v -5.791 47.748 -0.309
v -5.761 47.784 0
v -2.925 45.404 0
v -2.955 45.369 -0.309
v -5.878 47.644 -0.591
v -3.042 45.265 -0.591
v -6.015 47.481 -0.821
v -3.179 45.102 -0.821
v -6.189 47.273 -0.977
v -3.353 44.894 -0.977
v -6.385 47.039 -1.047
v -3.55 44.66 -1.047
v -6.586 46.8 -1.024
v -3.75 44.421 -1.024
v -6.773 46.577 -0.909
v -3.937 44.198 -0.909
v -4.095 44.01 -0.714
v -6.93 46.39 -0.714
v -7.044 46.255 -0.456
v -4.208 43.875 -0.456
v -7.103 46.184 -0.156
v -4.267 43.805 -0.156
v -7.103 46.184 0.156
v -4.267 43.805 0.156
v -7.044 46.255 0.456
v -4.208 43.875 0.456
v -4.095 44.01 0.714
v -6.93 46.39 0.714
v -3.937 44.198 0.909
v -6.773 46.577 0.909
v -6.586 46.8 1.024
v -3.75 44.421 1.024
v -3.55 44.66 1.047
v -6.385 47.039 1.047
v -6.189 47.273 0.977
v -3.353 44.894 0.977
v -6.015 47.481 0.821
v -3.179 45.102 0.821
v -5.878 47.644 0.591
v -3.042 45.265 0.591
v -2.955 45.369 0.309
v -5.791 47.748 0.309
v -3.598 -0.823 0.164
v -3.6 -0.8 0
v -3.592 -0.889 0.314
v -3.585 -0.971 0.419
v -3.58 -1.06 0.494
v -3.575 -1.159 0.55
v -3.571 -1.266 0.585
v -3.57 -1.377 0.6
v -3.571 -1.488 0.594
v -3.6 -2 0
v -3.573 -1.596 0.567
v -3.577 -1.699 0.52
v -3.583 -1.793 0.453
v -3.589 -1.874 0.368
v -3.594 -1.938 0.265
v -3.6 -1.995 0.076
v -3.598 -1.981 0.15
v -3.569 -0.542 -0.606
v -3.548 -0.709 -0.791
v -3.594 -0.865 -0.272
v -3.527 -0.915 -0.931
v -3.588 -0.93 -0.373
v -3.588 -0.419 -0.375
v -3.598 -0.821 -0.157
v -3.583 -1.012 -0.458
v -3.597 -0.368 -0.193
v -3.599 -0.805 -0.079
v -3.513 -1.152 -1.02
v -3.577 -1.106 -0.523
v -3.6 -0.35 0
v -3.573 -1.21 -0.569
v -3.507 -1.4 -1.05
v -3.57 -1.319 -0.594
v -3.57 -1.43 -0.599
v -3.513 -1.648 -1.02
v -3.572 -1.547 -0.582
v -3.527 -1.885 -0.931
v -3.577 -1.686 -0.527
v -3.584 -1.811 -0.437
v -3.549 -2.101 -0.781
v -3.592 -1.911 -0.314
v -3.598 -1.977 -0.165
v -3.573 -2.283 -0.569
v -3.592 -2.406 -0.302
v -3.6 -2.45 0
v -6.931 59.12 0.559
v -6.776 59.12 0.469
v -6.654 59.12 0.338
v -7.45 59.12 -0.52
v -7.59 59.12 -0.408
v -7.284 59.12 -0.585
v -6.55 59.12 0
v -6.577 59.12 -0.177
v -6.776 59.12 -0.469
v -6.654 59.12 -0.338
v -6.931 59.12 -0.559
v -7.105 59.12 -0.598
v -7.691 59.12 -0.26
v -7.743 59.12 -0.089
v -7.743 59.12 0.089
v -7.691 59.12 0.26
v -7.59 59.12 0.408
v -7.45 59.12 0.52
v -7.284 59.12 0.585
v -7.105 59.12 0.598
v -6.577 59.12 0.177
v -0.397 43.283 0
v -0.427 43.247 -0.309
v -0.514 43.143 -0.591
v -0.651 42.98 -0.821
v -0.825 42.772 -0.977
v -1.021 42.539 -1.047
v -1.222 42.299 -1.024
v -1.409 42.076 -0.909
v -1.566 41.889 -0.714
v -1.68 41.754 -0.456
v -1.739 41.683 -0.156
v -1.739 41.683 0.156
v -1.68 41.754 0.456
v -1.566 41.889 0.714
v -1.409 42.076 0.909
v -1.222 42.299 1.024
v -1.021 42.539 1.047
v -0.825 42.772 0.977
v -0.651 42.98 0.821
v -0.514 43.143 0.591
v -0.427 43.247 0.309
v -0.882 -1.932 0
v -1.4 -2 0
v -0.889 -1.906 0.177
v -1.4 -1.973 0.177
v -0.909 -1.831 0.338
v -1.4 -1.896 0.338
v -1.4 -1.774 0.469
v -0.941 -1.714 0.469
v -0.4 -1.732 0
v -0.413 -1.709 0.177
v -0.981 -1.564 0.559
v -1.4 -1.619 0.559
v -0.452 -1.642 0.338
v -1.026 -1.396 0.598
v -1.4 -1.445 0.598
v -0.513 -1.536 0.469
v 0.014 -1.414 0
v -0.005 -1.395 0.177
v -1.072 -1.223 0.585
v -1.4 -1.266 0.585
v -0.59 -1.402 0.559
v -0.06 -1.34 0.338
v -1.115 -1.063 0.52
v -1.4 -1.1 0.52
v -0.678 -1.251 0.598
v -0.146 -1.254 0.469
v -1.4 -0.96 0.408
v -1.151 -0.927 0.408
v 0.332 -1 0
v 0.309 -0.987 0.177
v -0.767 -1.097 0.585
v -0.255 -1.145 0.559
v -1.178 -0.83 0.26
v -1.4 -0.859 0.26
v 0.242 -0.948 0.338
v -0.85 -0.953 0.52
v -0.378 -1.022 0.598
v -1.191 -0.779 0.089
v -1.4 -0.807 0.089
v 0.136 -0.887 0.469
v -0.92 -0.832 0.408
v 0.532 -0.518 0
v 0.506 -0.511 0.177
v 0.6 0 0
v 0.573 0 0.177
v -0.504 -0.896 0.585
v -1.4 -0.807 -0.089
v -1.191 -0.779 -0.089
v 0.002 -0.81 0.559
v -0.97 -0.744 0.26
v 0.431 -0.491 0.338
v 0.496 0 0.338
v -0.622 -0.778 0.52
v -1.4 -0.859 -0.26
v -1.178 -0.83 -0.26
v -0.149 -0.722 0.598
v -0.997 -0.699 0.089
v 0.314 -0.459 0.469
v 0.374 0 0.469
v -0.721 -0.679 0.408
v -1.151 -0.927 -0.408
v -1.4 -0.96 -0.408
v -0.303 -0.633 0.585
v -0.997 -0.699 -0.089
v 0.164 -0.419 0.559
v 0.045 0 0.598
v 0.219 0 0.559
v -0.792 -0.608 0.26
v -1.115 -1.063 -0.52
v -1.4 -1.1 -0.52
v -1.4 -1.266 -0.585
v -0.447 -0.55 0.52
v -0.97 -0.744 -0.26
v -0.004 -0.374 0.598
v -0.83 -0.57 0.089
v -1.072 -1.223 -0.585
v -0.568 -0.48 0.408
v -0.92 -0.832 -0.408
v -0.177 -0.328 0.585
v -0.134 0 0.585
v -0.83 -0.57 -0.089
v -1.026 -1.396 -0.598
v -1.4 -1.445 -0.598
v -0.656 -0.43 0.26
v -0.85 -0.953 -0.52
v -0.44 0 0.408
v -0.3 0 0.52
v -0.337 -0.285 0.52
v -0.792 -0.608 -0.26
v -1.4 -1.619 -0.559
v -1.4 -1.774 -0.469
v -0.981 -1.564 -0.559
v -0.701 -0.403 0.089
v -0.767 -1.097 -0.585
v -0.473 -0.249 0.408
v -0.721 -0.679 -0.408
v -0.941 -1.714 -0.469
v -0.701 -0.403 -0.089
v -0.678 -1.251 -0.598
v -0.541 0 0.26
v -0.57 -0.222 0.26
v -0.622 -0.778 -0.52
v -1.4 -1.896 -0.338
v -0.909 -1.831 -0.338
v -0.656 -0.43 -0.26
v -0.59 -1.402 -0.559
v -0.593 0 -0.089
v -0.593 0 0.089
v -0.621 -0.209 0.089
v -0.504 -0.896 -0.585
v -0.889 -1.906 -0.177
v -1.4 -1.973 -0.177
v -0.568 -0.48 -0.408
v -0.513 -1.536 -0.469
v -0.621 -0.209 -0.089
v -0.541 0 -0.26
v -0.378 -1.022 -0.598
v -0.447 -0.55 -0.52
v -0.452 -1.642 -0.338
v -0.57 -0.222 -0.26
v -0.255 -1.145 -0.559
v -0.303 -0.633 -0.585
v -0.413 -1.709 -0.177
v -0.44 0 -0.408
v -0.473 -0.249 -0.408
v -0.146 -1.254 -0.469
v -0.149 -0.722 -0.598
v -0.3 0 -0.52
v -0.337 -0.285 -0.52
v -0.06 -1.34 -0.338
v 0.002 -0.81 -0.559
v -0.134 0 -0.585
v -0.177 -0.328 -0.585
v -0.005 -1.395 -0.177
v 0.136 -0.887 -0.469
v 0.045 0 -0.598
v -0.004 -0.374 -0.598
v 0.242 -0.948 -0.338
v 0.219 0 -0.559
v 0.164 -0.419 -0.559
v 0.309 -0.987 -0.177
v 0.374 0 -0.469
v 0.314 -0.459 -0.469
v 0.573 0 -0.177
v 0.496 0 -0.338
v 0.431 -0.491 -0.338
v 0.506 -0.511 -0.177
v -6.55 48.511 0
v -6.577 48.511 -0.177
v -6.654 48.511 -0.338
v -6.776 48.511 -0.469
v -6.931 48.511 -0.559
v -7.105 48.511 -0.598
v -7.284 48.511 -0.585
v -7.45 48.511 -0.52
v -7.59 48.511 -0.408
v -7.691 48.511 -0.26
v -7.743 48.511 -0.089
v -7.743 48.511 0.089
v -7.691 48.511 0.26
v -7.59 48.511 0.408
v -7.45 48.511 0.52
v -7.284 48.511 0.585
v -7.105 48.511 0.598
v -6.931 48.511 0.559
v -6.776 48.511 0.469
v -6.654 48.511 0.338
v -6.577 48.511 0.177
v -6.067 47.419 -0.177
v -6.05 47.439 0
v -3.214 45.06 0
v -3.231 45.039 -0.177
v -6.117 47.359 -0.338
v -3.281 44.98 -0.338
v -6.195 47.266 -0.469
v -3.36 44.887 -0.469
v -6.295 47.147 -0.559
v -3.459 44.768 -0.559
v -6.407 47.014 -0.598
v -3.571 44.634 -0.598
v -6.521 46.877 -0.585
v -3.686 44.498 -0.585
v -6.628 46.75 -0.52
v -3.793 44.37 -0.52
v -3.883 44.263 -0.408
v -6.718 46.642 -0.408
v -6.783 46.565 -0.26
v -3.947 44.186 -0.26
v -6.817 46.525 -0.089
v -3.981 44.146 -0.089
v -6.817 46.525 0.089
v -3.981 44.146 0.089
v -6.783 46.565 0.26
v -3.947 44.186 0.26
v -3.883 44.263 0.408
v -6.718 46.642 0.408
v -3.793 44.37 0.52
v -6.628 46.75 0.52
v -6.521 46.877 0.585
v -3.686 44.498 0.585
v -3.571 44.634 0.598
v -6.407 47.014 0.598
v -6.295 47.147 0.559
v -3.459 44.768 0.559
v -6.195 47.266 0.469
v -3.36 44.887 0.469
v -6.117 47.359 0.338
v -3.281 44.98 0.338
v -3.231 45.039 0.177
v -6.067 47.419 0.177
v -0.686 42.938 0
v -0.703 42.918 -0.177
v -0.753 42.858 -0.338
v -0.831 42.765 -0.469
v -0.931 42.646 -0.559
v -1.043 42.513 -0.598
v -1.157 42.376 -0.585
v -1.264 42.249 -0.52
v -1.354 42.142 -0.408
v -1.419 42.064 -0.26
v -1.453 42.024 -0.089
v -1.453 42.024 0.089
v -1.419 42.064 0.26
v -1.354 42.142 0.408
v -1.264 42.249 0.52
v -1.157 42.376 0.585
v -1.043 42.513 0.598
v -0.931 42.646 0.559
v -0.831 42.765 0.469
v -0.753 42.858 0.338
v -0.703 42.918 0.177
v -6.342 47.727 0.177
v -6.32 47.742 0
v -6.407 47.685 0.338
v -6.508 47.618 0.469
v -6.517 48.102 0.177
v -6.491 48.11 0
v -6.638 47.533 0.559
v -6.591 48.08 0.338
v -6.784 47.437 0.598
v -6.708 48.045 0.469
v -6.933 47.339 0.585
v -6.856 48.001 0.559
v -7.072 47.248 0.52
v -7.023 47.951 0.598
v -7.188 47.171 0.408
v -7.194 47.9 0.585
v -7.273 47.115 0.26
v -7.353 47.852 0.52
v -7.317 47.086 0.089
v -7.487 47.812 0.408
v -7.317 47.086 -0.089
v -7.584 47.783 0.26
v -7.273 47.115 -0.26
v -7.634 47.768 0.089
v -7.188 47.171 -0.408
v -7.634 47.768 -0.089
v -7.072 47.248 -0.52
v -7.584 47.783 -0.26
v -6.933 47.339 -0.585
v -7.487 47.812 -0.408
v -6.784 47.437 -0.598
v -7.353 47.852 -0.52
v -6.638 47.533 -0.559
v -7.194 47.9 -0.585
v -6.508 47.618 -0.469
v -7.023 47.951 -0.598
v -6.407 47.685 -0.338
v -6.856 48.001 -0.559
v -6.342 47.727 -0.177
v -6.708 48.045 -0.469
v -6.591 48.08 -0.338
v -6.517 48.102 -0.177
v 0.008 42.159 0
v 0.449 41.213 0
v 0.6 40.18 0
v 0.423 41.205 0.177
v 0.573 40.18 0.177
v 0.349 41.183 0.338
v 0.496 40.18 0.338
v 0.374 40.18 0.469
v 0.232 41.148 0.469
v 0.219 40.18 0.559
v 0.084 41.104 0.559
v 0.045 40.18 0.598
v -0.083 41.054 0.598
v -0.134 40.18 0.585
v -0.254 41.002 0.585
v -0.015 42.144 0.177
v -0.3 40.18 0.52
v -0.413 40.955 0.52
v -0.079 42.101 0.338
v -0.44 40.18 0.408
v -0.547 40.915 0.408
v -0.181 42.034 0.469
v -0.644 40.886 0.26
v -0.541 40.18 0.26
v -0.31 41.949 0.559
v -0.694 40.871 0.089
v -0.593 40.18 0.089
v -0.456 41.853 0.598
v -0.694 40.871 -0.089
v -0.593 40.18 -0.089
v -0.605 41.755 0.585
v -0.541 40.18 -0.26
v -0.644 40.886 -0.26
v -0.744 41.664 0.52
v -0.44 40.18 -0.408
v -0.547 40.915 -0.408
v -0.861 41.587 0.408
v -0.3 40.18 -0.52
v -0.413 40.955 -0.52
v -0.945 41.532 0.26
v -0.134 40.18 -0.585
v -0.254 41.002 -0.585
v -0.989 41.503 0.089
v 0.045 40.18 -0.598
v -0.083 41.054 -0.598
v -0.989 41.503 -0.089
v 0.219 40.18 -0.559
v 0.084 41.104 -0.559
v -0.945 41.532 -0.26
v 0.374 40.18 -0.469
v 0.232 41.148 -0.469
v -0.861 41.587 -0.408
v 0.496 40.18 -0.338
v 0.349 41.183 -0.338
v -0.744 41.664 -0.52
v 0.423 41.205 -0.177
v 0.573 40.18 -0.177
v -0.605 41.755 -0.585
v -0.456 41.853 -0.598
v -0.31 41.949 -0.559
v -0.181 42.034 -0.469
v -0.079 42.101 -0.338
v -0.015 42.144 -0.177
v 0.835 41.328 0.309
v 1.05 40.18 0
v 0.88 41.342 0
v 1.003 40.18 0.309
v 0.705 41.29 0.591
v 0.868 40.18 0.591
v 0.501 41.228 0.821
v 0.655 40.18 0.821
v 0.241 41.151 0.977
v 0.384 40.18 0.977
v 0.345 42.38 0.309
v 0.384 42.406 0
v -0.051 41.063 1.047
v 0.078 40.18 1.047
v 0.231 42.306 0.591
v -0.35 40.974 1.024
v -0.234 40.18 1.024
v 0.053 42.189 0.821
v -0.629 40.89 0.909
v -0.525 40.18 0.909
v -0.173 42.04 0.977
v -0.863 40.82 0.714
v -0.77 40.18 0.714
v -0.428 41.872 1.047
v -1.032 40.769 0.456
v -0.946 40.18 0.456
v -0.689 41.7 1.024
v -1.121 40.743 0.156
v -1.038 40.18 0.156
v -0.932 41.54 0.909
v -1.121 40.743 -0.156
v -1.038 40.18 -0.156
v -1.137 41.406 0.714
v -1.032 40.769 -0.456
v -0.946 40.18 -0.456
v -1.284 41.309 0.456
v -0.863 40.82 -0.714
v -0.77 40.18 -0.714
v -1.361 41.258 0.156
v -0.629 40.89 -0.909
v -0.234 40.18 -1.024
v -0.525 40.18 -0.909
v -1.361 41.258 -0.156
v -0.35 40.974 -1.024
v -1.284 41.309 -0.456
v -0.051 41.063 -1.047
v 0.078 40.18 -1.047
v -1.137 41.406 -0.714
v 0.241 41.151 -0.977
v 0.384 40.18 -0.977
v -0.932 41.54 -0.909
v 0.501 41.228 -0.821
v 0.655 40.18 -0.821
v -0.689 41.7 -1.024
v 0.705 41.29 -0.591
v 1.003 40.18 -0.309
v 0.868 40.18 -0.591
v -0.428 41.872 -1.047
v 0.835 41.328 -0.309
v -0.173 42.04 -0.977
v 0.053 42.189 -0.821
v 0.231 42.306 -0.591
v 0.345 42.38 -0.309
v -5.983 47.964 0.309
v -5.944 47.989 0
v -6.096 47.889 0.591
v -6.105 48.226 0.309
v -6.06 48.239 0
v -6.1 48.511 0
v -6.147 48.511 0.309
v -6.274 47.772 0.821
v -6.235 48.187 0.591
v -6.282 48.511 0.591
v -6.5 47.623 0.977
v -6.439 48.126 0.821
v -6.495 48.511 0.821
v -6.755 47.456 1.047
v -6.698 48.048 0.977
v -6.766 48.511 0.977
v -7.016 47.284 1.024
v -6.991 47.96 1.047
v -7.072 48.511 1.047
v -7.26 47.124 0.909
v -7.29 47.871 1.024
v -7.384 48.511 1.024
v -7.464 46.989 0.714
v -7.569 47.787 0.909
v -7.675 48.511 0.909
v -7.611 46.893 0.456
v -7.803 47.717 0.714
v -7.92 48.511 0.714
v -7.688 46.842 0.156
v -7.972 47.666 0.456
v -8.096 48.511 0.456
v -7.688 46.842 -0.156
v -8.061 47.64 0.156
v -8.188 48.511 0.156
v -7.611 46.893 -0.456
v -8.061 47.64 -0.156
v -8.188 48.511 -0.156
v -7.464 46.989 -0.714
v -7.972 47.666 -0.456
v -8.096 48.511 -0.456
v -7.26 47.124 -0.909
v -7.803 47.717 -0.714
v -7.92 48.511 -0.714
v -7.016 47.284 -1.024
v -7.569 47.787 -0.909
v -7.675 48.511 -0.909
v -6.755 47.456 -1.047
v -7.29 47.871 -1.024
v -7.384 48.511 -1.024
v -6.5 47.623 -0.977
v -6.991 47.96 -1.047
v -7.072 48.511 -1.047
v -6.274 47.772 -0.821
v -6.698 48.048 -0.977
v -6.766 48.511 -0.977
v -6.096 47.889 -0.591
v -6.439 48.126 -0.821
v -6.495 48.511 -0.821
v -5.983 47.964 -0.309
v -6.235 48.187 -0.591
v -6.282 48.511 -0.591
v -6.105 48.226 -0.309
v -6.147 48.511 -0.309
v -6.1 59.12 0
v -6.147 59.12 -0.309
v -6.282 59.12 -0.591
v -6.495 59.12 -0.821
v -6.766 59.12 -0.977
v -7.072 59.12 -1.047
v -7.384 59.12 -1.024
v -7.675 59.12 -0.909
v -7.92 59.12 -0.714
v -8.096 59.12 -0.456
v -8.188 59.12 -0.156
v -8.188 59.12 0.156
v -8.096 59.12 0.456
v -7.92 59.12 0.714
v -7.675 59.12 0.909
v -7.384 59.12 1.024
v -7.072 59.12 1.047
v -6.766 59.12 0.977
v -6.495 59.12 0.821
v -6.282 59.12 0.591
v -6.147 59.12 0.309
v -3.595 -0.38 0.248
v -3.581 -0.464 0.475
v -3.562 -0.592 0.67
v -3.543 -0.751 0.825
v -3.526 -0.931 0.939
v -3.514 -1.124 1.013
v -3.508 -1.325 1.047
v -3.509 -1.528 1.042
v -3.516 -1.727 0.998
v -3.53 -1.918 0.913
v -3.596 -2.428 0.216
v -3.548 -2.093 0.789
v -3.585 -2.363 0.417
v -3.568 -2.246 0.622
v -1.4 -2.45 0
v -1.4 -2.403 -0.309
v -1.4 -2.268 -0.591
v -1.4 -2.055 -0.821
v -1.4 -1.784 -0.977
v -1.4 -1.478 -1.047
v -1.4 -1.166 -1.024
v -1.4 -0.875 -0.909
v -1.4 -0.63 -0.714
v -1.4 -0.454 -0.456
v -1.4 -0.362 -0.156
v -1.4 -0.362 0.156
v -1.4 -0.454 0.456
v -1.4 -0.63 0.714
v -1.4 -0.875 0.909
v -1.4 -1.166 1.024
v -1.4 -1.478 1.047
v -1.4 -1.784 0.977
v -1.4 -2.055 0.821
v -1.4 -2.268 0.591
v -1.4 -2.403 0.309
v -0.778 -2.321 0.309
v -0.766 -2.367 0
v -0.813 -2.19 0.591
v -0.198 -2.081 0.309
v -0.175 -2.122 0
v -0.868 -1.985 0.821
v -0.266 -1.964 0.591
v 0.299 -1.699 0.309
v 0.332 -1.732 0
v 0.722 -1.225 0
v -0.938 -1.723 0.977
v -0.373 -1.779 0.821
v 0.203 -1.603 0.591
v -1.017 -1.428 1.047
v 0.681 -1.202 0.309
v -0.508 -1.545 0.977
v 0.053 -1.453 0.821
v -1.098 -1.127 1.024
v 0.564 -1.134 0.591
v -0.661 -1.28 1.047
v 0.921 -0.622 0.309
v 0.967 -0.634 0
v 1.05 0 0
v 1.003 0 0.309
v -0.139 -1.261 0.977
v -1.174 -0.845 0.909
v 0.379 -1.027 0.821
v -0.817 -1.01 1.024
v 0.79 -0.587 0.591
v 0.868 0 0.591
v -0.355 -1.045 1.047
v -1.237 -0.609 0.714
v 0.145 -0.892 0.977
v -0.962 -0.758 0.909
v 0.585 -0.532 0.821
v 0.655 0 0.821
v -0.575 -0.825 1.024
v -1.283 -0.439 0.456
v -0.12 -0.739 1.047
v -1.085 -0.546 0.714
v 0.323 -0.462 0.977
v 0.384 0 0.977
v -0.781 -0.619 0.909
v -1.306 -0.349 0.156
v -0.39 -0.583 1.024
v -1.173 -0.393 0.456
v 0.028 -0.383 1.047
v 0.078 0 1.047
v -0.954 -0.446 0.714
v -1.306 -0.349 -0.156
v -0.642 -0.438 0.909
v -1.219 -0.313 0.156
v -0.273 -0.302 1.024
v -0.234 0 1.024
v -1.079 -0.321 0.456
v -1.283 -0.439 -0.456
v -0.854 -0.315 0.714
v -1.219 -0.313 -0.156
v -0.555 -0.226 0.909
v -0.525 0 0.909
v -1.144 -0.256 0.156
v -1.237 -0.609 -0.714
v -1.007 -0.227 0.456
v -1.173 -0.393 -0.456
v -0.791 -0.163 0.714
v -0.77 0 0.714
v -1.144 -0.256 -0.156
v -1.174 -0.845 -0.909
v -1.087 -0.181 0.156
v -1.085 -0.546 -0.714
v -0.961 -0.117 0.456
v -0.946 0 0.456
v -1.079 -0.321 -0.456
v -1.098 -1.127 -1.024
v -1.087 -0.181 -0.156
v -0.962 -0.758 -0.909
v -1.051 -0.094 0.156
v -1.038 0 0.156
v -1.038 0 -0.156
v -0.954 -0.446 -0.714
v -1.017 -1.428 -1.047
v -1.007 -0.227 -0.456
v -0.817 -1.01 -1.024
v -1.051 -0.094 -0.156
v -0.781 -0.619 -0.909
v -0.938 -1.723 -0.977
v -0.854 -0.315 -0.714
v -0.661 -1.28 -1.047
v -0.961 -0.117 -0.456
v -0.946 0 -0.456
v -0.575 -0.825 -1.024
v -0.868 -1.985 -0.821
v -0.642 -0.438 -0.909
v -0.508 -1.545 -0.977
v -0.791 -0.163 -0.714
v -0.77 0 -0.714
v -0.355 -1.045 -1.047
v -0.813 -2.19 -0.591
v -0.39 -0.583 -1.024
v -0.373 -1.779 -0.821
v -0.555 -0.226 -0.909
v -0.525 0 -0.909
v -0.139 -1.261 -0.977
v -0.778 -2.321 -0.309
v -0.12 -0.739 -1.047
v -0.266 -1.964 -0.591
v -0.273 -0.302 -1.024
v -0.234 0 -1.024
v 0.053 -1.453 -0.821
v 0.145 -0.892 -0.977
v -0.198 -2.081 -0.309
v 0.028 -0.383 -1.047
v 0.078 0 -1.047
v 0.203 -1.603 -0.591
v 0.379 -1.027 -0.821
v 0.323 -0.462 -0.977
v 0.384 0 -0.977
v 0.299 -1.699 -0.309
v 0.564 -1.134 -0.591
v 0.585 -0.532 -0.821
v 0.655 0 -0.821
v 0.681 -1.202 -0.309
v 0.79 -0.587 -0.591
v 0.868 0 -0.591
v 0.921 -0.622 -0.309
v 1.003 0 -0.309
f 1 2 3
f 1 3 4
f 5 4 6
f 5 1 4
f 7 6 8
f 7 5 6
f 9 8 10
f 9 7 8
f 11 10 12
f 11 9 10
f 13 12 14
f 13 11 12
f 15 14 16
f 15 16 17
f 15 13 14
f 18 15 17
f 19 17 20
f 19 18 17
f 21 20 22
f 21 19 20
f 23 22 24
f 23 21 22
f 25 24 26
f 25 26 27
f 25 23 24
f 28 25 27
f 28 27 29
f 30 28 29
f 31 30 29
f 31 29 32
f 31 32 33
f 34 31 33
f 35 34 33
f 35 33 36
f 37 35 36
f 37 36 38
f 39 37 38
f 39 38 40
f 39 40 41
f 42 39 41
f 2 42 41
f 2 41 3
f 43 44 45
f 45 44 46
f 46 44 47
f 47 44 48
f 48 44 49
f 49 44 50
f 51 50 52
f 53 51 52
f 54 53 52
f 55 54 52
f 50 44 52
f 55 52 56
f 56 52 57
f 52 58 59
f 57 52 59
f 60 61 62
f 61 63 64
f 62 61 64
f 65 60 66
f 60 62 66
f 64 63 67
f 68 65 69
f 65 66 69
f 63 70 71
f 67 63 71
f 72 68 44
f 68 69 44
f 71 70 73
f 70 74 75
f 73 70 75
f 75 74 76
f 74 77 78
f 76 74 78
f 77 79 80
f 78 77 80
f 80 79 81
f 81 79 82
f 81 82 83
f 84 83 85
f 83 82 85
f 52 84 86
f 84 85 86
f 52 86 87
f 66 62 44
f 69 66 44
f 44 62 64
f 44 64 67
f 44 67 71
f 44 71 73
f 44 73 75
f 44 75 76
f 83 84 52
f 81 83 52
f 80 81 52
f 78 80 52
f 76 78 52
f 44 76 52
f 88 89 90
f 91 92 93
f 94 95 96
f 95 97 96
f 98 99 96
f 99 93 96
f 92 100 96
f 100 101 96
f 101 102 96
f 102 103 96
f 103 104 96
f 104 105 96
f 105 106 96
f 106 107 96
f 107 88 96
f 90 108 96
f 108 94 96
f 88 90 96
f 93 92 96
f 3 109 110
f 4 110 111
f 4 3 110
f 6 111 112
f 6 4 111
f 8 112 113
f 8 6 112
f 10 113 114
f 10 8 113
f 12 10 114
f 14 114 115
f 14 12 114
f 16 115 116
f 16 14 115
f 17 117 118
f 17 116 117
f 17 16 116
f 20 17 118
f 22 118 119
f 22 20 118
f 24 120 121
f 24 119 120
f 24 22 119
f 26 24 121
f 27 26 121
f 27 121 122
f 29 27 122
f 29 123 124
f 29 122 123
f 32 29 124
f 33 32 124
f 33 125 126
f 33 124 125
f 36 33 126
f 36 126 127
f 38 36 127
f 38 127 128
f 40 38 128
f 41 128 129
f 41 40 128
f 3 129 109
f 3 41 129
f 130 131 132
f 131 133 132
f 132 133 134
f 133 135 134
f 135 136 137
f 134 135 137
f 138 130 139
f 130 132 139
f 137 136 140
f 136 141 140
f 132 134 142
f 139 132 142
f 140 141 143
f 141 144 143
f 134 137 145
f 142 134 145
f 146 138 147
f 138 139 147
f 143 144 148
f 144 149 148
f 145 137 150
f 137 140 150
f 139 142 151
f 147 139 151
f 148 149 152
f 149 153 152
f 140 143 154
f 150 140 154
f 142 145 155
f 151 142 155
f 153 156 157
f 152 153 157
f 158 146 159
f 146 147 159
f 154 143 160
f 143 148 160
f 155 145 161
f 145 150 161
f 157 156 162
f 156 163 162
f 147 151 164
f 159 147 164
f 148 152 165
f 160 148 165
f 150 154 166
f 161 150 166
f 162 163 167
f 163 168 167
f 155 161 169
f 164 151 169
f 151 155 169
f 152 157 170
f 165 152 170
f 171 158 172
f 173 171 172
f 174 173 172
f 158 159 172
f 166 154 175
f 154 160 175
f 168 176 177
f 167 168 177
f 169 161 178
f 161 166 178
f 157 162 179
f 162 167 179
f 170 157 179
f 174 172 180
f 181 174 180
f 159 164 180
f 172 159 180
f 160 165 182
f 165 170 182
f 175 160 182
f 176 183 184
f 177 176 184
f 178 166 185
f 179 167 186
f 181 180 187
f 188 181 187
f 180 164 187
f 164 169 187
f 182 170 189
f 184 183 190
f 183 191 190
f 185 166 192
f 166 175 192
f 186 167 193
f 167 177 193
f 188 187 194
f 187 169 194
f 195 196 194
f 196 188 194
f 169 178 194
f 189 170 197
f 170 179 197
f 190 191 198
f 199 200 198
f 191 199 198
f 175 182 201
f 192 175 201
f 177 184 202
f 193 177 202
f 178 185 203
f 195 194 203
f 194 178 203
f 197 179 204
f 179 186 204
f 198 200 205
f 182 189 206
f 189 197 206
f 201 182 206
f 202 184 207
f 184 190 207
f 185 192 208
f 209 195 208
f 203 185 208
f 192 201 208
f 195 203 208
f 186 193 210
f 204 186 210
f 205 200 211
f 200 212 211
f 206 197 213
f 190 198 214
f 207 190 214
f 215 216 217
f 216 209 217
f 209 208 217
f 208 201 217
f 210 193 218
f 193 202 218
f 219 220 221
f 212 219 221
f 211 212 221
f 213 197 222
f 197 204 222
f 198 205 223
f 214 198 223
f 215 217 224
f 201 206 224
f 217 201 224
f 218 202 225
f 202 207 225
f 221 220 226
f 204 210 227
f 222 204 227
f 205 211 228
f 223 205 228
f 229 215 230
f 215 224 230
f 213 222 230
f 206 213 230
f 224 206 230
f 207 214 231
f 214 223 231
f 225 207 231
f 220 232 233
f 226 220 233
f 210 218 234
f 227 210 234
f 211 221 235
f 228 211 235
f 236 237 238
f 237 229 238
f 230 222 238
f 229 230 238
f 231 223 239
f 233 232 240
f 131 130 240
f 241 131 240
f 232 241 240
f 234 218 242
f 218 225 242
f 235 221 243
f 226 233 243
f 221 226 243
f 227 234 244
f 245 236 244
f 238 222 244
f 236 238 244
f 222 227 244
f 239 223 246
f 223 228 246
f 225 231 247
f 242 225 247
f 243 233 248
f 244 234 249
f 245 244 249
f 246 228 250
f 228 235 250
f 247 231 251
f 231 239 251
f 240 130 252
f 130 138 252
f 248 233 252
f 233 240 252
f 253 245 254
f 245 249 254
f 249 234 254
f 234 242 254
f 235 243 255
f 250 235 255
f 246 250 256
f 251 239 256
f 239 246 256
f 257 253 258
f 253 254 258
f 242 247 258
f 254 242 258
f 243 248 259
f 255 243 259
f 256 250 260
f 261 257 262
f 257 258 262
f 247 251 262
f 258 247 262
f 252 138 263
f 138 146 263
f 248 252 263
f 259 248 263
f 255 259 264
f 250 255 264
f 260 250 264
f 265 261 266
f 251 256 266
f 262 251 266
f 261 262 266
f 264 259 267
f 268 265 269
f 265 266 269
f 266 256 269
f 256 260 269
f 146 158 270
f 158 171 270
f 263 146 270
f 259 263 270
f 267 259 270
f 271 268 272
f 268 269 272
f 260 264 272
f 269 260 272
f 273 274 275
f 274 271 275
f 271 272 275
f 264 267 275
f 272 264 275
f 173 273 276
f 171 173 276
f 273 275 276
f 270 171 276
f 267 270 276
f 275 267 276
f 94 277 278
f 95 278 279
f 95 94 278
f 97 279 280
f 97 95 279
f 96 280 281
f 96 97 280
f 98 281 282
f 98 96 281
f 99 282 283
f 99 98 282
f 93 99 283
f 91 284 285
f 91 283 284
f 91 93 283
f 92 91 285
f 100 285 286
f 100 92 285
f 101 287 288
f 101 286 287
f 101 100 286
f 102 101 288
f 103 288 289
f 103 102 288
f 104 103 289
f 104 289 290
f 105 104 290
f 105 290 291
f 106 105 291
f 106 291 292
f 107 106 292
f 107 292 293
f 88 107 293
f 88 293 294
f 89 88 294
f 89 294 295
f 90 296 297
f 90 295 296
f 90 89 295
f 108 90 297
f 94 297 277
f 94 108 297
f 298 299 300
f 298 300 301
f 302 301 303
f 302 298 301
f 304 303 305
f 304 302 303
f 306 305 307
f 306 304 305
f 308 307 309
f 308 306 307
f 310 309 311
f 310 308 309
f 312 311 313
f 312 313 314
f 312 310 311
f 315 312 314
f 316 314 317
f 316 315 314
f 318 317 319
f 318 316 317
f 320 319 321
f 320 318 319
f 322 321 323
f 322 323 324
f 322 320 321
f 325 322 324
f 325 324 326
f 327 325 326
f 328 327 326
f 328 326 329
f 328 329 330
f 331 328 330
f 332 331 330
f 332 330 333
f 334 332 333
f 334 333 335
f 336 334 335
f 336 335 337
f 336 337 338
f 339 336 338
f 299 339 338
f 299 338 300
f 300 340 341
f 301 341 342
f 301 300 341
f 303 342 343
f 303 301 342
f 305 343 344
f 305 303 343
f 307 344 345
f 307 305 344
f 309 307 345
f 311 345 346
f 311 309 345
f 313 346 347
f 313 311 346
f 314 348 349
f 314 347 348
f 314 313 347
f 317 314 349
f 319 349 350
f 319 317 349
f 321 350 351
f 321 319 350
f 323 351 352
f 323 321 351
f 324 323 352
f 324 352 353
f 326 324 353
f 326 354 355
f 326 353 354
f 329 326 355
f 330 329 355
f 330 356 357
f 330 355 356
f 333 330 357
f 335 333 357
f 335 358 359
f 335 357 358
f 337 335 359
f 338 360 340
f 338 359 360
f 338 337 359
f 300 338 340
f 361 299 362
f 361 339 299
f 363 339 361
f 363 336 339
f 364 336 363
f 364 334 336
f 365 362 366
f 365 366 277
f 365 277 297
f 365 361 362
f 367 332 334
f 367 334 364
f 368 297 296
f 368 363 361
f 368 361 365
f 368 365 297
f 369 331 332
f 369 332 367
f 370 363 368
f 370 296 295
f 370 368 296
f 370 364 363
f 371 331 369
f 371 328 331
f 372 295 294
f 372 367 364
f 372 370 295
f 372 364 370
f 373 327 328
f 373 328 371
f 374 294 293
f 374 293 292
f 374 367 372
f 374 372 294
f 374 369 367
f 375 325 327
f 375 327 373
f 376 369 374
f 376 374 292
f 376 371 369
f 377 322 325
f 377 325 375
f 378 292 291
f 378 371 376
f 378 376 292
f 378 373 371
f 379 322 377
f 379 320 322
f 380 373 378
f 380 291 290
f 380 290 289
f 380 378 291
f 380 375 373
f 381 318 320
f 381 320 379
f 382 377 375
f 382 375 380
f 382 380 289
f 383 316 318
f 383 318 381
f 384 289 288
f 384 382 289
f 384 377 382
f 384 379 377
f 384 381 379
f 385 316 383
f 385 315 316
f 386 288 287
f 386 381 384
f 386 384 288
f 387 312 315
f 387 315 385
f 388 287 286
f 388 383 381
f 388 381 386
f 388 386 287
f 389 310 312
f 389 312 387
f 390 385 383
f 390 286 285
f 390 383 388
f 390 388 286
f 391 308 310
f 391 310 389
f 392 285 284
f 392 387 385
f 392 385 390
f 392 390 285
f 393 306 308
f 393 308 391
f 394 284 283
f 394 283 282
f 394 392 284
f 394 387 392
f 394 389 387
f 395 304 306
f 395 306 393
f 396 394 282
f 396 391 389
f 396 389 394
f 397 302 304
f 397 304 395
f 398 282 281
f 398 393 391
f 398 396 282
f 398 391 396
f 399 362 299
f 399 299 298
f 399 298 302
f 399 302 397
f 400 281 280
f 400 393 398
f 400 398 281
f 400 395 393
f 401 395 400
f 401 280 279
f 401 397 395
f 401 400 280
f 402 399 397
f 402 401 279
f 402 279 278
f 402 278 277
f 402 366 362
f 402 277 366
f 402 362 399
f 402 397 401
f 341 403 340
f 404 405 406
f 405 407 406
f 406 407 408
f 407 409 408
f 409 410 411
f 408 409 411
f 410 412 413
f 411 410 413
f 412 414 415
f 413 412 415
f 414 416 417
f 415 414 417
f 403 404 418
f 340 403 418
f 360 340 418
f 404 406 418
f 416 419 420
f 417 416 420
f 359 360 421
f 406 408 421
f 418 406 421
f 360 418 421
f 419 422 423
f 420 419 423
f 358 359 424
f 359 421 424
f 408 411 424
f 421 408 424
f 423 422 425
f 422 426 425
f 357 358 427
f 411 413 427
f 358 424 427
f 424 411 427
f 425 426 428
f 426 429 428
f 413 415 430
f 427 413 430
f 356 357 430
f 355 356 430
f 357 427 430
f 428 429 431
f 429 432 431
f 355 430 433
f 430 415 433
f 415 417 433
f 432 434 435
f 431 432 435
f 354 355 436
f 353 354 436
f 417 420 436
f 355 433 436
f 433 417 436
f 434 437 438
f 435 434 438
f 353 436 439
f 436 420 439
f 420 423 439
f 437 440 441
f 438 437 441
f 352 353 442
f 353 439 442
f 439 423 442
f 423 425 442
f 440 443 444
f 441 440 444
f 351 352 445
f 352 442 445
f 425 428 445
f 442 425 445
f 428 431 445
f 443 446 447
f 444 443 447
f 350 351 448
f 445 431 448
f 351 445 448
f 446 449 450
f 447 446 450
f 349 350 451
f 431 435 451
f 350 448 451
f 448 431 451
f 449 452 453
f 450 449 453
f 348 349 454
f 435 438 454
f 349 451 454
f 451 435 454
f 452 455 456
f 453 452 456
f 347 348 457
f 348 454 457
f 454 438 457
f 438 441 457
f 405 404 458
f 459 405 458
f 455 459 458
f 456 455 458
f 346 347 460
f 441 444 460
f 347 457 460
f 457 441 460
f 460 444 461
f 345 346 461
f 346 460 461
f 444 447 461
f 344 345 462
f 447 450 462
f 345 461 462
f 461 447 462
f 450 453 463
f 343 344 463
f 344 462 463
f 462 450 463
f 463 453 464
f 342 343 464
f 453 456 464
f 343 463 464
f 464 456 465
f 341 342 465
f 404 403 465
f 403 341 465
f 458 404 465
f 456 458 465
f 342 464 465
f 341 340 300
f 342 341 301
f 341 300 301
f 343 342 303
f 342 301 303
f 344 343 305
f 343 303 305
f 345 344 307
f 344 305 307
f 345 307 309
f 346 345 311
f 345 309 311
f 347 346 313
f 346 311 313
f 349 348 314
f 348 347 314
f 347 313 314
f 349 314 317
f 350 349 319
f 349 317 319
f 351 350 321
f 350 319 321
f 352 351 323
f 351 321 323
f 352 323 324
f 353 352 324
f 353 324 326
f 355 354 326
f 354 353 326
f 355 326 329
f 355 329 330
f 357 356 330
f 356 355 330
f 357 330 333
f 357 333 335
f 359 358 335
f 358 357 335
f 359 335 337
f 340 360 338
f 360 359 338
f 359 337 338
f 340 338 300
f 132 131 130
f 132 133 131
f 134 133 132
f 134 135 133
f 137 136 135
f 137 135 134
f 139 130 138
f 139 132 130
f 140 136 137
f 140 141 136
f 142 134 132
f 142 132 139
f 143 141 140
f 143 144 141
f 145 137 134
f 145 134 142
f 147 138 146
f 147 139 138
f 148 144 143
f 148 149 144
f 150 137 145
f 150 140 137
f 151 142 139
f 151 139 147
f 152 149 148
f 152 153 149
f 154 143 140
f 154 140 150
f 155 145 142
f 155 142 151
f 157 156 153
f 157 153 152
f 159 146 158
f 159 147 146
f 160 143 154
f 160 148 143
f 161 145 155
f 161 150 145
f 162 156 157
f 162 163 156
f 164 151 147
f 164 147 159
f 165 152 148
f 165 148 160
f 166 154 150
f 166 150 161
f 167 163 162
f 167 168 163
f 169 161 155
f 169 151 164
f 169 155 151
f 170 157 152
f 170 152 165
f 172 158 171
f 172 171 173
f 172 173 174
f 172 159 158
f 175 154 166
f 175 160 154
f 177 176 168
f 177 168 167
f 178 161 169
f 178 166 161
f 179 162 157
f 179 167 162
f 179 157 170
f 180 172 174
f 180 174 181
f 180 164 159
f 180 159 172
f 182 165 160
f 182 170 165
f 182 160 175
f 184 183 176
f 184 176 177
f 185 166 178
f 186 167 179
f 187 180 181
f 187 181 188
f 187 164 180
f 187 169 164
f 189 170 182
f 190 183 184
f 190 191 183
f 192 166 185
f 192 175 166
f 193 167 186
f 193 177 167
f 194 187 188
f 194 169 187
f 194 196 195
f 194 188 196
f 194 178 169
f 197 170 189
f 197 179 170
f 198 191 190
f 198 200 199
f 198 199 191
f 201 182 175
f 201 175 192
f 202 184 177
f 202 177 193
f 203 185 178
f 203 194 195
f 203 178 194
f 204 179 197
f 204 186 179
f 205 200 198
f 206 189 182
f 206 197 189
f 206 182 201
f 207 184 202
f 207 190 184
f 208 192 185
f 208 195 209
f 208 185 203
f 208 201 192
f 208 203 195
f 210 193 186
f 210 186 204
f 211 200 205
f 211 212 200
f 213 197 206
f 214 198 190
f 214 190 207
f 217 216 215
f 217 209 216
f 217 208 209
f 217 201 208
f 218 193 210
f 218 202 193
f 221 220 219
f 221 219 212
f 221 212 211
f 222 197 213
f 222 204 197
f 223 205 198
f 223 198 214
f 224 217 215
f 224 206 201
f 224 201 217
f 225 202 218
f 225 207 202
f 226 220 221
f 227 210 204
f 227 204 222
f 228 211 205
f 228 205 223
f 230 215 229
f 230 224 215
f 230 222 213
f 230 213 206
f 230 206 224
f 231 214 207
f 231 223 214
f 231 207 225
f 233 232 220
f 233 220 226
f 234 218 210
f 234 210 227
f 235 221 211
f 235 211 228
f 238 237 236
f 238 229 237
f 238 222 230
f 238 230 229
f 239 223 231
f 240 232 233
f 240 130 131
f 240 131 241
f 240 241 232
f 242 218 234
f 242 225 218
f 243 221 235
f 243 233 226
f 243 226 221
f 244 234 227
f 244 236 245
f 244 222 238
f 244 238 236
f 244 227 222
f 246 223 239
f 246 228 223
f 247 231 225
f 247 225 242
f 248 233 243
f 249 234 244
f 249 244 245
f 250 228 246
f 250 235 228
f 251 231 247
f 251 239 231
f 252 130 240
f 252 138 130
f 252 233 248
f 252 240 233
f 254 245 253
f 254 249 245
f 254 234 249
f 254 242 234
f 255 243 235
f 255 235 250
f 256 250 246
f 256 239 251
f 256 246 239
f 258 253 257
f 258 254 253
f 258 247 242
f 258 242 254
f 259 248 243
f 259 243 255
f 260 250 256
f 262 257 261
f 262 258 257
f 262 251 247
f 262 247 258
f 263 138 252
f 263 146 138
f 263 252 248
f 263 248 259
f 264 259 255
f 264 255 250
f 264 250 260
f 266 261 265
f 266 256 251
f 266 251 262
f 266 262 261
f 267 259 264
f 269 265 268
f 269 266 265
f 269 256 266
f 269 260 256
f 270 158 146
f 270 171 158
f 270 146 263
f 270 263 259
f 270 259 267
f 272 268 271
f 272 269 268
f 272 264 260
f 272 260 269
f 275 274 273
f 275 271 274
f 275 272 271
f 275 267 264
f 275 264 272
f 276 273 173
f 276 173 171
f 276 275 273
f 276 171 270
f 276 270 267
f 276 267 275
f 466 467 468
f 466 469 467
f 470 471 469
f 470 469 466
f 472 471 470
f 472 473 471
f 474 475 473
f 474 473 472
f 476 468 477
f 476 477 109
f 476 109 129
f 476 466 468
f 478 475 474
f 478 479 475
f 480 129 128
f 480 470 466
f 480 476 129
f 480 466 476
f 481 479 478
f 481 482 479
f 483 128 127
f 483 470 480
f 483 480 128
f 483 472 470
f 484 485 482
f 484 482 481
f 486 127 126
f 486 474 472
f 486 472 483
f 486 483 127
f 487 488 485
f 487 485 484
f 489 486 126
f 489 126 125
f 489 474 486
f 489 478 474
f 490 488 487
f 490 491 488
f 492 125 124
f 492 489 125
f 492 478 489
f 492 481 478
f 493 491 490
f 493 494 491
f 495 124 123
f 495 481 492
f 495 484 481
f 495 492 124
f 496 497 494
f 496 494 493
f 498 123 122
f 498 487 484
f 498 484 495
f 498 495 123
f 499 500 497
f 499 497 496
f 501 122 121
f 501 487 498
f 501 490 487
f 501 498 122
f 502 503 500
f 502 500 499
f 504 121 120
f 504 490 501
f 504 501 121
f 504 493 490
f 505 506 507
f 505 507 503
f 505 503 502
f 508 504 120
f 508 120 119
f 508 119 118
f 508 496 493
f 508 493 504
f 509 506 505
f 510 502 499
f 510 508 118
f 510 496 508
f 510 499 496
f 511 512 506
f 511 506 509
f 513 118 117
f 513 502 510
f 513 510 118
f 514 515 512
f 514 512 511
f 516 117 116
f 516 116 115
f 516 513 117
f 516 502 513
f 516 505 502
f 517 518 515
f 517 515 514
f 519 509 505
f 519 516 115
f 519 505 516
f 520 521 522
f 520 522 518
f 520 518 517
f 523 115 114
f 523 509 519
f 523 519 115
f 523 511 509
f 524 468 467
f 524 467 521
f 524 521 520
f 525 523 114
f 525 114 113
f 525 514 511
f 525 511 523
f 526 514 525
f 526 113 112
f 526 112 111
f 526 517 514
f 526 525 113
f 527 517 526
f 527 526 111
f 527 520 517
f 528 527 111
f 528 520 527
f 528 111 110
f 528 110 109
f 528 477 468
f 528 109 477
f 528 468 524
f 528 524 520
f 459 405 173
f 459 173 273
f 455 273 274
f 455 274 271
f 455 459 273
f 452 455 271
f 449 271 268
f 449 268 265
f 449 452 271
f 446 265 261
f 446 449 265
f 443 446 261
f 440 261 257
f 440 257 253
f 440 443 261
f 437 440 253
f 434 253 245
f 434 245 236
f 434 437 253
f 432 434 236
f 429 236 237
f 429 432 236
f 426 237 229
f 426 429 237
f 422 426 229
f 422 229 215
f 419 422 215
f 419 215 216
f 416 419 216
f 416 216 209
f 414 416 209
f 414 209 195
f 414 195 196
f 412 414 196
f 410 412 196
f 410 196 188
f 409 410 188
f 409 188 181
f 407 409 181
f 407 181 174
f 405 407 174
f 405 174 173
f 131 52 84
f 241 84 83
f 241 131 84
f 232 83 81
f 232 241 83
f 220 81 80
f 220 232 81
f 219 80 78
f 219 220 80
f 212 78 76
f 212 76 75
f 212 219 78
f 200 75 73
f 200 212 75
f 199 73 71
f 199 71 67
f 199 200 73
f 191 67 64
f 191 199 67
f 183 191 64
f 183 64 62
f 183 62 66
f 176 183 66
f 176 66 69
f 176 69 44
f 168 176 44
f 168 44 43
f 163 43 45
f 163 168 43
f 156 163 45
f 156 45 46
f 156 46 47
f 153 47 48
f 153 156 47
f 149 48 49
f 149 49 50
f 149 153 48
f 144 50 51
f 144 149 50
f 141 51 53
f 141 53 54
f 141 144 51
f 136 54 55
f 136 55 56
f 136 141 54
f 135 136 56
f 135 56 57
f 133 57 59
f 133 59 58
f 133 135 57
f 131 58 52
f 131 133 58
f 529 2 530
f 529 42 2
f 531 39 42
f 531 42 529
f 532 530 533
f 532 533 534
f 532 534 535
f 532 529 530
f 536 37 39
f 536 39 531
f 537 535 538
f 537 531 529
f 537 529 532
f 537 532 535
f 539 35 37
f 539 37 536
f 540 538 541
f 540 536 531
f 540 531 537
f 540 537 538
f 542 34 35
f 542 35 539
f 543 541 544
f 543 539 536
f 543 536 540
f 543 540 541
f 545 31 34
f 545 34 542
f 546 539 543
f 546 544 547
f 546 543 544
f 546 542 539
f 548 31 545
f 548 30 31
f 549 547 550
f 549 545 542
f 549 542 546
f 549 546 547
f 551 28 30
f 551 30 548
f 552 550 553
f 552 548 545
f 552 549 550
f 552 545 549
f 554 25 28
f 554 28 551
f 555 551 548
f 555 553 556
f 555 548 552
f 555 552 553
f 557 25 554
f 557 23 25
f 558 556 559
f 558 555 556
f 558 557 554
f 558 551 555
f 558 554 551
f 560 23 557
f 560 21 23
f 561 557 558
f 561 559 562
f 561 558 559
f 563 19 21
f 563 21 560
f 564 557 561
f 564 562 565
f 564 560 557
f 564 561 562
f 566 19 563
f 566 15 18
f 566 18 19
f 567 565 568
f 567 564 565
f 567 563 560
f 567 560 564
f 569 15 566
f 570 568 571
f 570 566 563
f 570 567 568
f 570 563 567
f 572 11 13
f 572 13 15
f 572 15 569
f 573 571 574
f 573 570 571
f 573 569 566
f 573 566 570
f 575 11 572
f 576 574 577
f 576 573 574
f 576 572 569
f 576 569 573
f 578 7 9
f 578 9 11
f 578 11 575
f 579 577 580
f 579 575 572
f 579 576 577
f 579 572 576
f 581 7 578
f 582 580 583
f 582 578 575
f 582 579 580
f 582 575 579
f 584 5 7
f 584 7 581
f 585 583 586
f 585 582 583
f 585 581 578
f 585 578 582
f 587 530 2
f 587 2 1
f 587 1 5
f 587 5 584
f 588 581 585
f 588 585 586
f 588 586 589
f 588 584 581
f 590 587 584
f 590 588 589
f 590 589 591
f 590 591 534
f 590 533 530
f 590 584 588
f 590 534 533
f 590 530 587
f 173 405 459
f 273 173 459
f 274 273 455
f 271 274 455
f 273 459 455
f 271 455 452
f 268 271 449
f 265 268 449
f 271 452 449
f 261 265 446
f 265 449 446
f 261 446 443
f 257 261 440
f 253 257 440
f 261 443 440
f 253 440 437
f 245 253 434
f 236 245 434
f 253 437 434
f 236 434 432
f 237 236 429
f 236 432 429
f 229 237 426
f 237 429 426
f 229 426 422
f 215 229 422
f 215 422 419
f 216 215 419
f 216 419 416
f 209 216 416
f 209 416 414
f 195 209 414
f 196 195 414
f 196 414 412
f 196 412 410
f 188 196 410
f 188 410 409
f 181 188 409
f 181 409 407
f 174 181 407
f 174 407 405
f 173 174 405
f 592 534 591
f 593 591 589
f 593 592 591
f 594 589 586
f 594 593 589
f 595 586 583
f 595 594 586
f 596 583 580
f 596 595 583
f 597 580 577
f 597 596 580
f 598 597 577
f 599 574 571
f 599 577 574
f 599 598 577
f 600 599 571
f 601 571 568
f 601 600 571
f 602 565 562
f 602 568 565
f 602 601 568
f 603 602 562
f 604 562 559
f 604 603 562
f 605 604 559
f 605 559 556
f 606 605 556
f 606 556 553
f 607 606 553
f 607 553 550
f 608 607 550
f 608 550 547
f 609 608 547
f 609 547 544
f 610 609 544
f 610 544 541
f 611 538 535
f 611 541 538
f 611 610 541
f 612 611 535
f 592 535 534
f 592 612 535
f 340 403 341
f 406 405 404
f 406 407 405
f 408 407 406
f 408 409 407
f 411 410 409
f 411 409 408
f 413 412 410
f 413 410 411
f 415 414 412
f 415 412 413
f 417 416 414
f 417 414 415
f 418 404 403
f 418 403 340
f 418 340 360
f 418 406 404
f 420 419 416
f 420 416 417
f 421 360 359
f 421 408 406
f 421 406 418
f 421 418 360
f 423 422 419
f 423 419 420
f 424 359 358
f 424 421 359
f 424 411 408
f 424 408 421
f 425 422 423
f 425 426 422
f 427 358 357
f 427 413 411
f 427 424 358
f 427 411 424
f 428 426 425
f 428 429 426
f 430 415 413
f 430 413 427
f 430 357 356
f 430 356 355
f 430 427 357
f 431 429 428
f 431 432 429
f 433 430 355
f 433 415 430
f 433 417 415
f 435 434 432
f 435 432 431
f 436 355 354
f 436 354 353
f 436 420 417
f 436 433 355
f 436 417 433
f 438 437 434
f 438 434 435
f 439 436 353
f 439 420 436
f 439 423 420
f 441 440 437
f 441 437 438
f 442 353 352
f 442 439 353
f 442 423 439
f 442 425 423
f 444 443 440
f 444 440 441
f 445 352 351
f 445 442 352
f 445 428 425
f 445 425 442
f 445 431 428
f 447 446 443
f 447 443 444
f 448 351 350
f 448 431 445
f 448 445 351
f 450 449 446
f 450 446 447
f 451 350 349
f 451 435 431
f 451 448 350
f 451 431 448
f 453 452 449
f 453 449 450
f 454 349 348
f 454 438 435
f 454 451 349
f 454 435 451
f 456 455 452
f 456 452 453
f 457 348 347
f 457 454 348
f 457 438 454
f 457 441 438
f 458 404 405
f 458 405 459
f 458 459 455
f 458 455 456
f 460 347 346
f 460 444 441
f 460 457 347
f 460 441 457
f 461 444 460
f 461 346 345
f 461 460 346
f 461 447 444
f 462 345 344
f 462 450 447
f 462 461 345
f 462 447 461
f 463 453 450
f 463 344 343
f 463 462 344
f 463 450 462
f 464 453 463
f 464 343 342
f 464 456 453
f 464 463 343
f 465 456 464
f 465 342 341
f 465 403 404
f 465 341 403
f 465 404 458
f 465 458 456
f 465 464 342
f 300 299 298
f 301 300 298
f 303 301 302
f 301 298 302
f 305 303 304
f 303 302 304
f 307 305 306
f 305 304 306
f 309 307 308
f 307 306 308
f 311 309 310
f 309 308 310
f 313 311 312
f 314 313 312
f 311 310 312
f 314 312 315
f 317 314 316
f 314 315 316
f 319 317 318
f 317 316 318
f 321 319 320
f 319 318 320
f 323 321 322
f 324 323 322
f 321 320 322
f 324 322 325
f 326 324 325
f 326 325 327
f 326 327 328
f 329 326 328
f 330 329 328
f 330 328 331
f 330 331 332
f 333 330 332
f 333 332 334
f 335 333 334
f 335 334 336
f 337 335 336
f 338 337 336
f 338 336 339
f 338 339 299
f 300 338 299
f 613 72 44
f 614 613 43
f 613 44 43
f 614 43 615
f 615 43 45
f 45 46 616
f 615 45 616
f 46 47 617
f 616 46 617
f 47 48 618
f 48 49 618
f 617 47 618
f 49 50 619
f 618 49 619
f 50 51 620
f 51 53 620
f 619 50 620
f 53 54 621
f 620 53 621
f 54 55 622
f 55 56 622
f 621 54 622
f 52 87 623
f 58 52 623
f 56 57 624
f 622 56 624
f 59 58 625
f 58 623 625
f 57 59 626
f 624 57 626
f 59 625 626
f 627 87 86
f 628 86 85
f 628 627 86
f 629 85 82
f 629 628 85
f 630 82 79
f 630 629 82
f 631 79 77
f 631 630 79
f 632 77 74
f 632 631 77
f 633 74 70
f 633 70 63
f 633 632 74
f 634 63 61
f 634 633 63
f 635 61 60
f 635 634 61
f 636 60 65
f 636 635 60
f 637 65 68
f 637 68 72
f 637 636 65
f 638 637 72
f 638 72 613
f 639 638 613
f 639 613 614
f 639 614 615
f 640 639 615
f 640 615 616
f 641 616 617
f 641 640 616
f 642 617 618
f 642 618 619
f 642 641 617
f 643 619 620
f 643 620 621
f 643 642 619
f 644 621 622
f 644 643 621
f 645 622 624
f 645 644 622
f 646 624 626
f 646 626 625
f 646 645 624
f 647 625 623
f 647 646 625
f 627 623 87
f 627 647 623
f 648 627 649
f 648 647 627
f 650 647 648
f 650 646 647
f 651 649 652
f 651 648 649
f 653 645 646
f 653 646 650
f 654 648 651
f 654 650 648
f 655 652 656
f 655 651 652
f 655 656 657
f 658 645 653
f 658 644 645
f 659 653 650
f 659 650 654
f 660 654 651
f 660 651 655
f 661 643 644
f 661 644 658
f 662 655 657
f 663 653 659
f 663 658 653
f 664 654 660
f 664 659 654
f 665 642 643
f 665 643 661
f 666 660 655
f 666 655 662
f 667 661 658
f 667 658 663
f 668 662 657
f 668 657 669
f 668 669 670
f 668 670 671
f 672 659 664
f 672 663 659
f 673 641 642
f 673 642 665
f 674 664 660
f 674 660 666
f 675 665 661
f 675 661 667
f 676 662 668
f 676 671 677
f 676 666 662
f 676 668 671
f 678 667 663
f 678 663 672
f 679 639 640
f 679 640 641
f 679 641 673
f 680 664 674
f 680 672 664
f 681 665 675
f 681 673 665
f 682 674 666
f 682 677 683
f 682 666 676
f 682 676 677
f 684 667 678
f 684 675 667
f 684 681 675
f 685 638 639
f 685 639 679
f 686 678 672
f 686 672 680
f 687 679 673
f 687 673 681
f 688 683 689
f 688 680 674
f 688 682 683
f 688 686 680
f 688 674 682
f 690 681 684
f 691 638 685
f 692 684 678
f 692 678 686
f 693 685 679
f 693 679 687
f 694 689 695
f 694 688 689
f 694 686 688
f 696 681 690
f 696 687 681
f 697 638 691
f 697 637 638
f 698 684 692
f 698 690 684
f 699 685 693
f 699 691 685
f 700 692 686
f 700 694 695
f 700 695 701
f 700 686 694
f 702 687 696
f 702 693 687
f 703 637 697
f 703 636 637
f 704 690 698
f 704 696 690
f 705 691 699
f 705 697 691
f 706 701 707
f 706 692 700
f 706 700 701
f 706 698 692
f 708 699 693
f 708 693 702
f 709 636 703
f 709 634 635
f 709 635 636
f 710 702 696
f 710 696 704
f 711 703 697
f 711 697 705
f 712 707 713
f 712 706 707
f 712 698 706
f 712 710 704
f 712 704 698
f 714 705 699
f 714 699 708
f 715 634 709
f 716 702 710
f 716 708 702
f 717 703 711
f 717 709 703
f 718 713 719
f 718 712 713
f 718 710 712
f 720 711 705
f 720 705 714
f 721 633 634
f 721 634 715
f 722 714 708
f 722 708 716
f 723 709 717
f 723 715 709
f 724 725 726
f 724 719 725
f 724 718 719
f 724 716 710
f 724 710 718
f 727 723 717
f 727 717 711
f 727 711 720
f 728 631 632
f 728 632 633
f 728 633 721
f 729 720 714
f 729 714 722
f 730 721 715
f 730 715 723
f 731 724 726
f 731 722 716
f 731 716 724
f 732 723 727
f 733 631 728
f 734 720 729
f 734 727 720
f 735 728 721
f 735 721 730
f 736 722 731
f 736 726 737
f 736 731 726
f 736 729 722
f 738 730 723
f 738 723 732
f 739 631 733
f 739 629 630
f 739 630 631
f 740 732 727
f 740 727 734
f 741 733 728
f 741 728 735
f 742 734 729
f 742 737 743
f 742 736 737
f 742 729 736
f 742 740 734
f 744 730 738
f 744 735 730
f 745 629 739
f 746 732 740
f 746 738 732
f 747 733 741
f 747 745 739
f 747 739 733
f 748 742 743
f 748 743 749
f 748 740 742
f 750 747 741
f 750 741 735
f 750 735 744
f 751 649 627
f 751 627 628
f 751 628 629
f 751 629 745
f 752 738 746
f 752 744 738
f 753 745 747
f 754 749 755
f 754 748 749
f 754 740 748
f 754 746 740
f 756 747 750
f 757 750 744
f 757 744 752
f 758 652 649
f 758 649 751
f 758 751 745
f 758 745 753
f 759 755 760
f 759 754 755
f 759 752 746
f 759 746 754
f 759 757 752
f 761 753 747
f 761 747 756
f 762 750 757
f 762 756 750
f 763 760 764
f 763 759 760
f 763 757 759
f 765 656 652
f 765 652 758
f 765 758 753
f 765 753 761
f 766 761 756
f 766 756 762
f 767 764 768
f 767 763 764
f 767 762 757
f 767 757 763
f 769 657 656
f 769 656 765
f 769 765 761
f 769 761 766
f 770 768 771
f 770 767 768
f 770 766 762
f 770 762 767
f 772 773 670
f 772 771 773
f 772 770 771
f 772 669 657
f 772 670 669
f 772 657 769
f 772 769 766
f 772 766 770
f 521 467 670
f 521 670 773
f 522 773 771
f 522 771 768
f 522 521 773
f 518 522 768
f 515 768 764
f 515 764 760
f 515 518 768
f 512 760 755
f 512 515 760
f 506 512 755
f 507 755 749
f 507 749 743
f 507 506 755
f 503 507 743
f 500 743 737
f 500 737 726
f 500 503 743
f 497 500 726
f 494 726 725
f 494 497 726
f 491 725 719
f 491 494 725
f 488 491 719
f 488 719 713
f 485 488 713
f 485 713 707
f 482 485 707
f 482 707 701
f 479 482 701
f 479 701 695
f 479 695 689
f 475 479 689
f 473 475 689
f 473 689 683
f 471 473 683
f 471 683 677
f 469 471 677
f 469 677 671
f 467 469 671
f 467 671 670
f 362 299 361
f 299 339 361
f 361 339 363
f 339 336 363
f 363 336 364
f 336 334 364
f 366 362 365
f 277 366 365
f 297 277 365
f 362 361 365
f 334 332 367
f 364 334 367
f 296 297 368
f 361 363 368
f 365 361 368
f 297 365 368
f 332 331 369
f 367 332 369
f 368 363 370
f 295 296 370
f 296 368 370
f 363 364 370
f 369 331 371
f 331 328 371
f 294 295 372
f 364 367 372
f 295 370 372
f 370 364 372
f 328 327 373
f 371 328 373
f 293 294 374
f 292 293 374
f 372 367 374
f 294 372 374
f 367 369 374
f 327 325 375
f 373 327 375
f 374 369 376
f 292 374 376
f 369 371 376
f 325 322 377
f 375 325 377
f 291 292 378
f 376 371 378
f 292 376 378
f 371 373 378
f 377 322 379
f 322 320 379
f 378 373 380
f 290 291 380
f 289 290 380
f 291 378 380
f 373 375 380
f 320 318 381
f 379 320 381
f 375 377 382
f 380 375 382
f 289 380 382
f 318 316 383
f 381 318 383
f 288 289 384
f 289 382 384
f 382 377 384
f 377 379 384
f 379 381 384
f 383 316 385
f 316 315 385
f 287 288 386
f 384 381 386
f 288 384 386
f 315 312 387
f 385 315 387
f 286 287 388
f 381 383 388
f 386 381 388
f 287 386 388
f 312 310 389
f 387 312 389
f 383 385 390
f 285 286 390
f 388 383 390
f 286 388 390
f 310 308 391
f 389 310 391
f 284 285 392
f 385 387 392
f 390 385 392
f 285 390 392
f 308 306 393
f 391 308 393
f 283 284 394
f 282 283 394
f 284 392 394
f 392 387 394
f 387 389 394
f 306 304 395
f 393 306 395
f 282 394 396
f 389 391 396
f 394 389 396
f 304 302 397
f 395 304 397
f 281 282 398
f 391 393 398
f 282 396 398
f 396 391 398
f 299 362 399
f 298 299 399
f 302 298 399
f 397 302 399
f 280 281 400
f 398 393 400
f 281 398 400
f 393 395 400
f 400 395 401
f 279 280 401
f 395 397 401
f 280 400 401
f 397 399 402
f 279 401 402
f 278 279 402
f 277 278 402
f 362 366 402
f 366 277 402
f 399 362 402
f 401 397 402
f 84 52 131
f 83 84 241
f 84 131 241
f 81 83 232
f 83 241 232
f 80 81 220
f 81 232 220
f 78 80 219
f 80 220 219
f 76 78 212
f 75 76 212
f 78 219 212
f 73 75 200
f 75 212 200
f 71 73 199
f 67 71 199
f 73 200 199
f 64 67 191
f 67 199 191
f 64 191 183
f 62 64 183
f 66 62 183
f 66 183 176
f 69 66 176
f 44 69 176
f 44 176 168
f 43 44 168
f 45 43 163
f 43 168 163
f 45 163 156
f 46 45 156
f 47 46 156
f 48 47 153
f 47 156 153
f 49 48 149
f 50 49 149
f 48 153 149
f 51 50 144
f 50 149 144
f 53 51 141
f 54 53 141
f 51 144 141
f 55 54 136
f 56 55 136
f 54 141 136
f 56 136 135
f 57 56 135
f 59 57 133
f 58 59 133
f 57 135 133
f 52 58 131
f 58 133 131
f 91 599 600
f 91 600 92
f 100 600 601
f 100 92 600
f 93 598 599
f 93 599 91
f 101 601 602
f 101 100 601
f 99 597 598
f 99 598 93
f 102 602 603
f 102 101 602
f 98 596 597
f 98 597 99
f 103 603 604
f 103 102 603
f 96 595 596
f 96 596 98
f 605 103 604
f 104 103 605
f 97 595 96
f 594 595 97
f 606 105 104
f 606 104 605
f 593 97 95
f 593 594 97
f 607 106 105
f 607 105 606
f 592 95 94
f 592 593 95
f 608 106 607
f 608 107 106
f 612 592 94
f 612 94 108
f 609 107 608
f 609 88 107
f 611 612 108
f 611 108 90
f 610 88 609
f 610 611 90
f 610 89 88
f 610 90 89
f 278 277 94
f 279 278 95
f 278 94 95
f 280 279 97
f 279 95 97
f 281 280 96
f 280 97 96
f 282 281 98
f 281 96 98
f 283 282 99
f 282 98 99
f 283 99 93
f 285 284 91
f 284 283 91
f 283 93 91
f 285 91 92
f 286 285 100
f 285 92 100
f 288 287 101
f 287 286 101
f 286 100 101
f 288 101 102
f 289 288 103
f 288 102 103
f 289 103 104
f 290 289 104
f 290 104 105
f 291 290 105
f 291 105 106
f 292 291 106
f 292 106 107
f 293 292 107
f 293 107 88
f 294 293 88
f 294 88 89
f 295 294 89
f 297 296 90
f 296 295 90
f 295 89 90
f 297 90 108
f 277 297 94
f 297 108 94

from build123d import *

# Parameters (mm, degrees)
SKETCH_1_R          = 1.05
SKETCH_3_R          = 0.6
SKETCH_4_R          = 0.6
SKETCH_6_R          = 0.6
SKETCH_7_R          = 1.05
SKETCH_7_R_2        = 0.6
CUT_EXTRUDE_1_DEPTH = 10
CUT_EXTRUDE_2_DEPTH = 10


with BuildPart() as part:
    # Sweep 1: sweep along a path in Эскиз2
    with BuildLine(Plane.XY) as sweep_1_path:
        Line((0, 0), (0, 40.180318356))
        ThreePointArc((0, 40.180318356), (-0.281076639, 41.448173141), (-1.071637171, 42.478451685))
        Line((-1.071637171, 42.478451685), (-3.6, 44.600000002))
        Line((-3.6, 44.600000002), (-6.435575219, 46.979330123))
        ThreePointArc((-6.435575219, 46.979330123), (-6.962615574, 47.666182486), (-7.15, 48.511419009))
        Line((-7.15, 48.511419009), (-7.15, 59.119549689))
    # Эскиз1 → Sweep 1 (sweep)
    with BuildSketch(Plane(origin=(0, 0, 0), x_dir=(1, 0, 0), z_dir=(0, 1, 0))):
        Circle(SKETCH_1_R)
    sweep(path=sweep_1_path.line)

    # Sweep 1 2: sweep along a path in Эскиз2<2>
    with BuildLine(Plane.XY) as sweep_1_2_path:
        Line((0, 0), (0, 40.180318356))
        ThreePointArc((0, 40.180318356), (-0.281076639, 41.448173141), (-1.071637171, 42.478451685))
        Line((-1.071637171, 42.478451685), (-3.6, 44.600000002))
        Line((-3.6, 44.600000002), (-6.435575219, 46.979330123))
        ThreePointArc((-6.435575219, 46.979330123), (-6.962615574, 47.666182486), (-7.15, 48.511419009))
        Line((-7.15, 48.511419009), (-7.15, 59.119549689))
    # Эскиз3 → Sweep 1 2 (sweep, cut)
    with BuildSketch(Plane.XZ):
        Circle(SKETCH_3_R)
    sweep(path=sweep_1_2_path.line, mode=Mode.SUBTRACT)

    # По траектории4: sweep along a path in Эскиз5<2>
    with BuildLine(Plane.XY) as sweep_4_path:
        Line((-3.6, -1.4), (-1.4, -1.4))
        ThreePointArc((-1.4, -1.4), (-0.410050506, -0.989949494), (0, 0))
    # Эскиз7 → По траектории4 (sweep)
    with BuildSketch(Plane.XZ):
        Circle(SKETCH_7_R)
        Circle(SKETCH_7_R_2, mode=Mode.SUBTRACT)
    sweep(path=sweep_4_path.line)


with BuildPart() as body_2:
    # По траектории2: sweep along a path in Эскиз2<3>
    with BuildLine(Plane.XY) as sweep_2_path:
        Line((0, 0), (0, 40.180318356))
        ThreePointArc((0, 40.180318356), (-0.281076639, 41.448173141), (-1.071637171, 42.478451685))
        Line((-1.071637171, 42.478451685), (-3.6, 44.600000002))
        Line((-3.6, 44.600000002), (-6.435575219, 46.979330123))
        ThreePointArc((-6.435575219, 46.979330123), (-6.962615574, 47.666182486), (-7.15, 48.511419009))
        Line((-7.15, 48.511419009), (-7.15, 59.119549689))
    # Эскиз4 → По траектории2 (sweep)
    with BuildSketch(Plane.XZ):
        Circle(SKETCH_4_R)
    sweep(path=sweep_2_path.line)

    # По траектории3: sweep along a path in Эскиз5
    with BuildLine(Plane.XY) as sweep_3_path:
        Line((-3.6, -1.4), (-1.4, -1.4))
        ThreePointArc((-1.4, -1.4), (-0.410050506, -0.989949494), (0, 0))
    # Эскиз6 → По траектории3 (sweep)
    with BuildSketch(Plane.XZ):
        Circle(SKETCH_6_R)
    sweep(path=sweep_3_path.line)


with BuildPart() as cut_extrude_1_tool:
    # Эскиз8 → Вырез-Вытянуть1 (new body)
    with BuildSketch(Plane(origin=(0, -2.45, 0), x_dir=(-1, 0, 0), z_dir=(0, -1, 0))):
        with BuildLine():
            ThreePointArc((3.5074106, 1.05), (3.576807827, 0.52703719), (3.6, 0))
            Line((3.6, 0), (3.6, 1.05))
            Line((3.6, 1.05), (3.5074106, 1.05))
        make_face()
    extrude(amount=-CUT_EXTRUDE_1_DEPTH)


with BuildPart() as part_1:
    add(part.part)

    # Вырез-Вытянуть1: cut by cut_extrude_1_tool
    add(cut_extrude_1_tool.part, mode=Mode.SUBTRACT)


with BuildPart() as body_2_1:
    add(body_2.part)

    # Вырез-Вытянуть1: cut by cut_extrude_1_tool
    add(cut_extrude_1_tool.part, mode=Mode.SUBTRACT)


with BuildPart() as cut_extrude_2_tool:
    # Эскиз8<3> → Вырез-Вытянуть2 (new body)
    with BuildSketch(Plane(origin=(0, -2.45, 0), x_dir=(-1, 0, 0), z_dir=(0, -1, 0))):
        with BuildLine():
            Line((3.5074106, -1.05), (3.6, -1.05))
            Line((3.6, -1.05), (3.6, 0))
            ThreePointArc((3.6, 0), (3.576807827, -0.52703719), (3.5074106, -1.05))
        make_face()
    extrude(amount=-CUT_EXTRUDE_2_DEPTH)


with BuildPart() as part_2:
    add(part_1.part)

    # Вырез-Вытянуть2: cut by cut_extrude_2_tool
    add(cut_extrude_2_tool.part, mode=Mode.SUBTRACT)


with BuildPart() as body_2_2:
    add(body_2_1.part)

    # Вырез-Вытянуть2: cut by cut_extrude_2_tool
    add(cut_extrude_2_tool.part, mode=Mode.SUBTRACT)


solid = Compound([part_2.part, body_2_2.part])
